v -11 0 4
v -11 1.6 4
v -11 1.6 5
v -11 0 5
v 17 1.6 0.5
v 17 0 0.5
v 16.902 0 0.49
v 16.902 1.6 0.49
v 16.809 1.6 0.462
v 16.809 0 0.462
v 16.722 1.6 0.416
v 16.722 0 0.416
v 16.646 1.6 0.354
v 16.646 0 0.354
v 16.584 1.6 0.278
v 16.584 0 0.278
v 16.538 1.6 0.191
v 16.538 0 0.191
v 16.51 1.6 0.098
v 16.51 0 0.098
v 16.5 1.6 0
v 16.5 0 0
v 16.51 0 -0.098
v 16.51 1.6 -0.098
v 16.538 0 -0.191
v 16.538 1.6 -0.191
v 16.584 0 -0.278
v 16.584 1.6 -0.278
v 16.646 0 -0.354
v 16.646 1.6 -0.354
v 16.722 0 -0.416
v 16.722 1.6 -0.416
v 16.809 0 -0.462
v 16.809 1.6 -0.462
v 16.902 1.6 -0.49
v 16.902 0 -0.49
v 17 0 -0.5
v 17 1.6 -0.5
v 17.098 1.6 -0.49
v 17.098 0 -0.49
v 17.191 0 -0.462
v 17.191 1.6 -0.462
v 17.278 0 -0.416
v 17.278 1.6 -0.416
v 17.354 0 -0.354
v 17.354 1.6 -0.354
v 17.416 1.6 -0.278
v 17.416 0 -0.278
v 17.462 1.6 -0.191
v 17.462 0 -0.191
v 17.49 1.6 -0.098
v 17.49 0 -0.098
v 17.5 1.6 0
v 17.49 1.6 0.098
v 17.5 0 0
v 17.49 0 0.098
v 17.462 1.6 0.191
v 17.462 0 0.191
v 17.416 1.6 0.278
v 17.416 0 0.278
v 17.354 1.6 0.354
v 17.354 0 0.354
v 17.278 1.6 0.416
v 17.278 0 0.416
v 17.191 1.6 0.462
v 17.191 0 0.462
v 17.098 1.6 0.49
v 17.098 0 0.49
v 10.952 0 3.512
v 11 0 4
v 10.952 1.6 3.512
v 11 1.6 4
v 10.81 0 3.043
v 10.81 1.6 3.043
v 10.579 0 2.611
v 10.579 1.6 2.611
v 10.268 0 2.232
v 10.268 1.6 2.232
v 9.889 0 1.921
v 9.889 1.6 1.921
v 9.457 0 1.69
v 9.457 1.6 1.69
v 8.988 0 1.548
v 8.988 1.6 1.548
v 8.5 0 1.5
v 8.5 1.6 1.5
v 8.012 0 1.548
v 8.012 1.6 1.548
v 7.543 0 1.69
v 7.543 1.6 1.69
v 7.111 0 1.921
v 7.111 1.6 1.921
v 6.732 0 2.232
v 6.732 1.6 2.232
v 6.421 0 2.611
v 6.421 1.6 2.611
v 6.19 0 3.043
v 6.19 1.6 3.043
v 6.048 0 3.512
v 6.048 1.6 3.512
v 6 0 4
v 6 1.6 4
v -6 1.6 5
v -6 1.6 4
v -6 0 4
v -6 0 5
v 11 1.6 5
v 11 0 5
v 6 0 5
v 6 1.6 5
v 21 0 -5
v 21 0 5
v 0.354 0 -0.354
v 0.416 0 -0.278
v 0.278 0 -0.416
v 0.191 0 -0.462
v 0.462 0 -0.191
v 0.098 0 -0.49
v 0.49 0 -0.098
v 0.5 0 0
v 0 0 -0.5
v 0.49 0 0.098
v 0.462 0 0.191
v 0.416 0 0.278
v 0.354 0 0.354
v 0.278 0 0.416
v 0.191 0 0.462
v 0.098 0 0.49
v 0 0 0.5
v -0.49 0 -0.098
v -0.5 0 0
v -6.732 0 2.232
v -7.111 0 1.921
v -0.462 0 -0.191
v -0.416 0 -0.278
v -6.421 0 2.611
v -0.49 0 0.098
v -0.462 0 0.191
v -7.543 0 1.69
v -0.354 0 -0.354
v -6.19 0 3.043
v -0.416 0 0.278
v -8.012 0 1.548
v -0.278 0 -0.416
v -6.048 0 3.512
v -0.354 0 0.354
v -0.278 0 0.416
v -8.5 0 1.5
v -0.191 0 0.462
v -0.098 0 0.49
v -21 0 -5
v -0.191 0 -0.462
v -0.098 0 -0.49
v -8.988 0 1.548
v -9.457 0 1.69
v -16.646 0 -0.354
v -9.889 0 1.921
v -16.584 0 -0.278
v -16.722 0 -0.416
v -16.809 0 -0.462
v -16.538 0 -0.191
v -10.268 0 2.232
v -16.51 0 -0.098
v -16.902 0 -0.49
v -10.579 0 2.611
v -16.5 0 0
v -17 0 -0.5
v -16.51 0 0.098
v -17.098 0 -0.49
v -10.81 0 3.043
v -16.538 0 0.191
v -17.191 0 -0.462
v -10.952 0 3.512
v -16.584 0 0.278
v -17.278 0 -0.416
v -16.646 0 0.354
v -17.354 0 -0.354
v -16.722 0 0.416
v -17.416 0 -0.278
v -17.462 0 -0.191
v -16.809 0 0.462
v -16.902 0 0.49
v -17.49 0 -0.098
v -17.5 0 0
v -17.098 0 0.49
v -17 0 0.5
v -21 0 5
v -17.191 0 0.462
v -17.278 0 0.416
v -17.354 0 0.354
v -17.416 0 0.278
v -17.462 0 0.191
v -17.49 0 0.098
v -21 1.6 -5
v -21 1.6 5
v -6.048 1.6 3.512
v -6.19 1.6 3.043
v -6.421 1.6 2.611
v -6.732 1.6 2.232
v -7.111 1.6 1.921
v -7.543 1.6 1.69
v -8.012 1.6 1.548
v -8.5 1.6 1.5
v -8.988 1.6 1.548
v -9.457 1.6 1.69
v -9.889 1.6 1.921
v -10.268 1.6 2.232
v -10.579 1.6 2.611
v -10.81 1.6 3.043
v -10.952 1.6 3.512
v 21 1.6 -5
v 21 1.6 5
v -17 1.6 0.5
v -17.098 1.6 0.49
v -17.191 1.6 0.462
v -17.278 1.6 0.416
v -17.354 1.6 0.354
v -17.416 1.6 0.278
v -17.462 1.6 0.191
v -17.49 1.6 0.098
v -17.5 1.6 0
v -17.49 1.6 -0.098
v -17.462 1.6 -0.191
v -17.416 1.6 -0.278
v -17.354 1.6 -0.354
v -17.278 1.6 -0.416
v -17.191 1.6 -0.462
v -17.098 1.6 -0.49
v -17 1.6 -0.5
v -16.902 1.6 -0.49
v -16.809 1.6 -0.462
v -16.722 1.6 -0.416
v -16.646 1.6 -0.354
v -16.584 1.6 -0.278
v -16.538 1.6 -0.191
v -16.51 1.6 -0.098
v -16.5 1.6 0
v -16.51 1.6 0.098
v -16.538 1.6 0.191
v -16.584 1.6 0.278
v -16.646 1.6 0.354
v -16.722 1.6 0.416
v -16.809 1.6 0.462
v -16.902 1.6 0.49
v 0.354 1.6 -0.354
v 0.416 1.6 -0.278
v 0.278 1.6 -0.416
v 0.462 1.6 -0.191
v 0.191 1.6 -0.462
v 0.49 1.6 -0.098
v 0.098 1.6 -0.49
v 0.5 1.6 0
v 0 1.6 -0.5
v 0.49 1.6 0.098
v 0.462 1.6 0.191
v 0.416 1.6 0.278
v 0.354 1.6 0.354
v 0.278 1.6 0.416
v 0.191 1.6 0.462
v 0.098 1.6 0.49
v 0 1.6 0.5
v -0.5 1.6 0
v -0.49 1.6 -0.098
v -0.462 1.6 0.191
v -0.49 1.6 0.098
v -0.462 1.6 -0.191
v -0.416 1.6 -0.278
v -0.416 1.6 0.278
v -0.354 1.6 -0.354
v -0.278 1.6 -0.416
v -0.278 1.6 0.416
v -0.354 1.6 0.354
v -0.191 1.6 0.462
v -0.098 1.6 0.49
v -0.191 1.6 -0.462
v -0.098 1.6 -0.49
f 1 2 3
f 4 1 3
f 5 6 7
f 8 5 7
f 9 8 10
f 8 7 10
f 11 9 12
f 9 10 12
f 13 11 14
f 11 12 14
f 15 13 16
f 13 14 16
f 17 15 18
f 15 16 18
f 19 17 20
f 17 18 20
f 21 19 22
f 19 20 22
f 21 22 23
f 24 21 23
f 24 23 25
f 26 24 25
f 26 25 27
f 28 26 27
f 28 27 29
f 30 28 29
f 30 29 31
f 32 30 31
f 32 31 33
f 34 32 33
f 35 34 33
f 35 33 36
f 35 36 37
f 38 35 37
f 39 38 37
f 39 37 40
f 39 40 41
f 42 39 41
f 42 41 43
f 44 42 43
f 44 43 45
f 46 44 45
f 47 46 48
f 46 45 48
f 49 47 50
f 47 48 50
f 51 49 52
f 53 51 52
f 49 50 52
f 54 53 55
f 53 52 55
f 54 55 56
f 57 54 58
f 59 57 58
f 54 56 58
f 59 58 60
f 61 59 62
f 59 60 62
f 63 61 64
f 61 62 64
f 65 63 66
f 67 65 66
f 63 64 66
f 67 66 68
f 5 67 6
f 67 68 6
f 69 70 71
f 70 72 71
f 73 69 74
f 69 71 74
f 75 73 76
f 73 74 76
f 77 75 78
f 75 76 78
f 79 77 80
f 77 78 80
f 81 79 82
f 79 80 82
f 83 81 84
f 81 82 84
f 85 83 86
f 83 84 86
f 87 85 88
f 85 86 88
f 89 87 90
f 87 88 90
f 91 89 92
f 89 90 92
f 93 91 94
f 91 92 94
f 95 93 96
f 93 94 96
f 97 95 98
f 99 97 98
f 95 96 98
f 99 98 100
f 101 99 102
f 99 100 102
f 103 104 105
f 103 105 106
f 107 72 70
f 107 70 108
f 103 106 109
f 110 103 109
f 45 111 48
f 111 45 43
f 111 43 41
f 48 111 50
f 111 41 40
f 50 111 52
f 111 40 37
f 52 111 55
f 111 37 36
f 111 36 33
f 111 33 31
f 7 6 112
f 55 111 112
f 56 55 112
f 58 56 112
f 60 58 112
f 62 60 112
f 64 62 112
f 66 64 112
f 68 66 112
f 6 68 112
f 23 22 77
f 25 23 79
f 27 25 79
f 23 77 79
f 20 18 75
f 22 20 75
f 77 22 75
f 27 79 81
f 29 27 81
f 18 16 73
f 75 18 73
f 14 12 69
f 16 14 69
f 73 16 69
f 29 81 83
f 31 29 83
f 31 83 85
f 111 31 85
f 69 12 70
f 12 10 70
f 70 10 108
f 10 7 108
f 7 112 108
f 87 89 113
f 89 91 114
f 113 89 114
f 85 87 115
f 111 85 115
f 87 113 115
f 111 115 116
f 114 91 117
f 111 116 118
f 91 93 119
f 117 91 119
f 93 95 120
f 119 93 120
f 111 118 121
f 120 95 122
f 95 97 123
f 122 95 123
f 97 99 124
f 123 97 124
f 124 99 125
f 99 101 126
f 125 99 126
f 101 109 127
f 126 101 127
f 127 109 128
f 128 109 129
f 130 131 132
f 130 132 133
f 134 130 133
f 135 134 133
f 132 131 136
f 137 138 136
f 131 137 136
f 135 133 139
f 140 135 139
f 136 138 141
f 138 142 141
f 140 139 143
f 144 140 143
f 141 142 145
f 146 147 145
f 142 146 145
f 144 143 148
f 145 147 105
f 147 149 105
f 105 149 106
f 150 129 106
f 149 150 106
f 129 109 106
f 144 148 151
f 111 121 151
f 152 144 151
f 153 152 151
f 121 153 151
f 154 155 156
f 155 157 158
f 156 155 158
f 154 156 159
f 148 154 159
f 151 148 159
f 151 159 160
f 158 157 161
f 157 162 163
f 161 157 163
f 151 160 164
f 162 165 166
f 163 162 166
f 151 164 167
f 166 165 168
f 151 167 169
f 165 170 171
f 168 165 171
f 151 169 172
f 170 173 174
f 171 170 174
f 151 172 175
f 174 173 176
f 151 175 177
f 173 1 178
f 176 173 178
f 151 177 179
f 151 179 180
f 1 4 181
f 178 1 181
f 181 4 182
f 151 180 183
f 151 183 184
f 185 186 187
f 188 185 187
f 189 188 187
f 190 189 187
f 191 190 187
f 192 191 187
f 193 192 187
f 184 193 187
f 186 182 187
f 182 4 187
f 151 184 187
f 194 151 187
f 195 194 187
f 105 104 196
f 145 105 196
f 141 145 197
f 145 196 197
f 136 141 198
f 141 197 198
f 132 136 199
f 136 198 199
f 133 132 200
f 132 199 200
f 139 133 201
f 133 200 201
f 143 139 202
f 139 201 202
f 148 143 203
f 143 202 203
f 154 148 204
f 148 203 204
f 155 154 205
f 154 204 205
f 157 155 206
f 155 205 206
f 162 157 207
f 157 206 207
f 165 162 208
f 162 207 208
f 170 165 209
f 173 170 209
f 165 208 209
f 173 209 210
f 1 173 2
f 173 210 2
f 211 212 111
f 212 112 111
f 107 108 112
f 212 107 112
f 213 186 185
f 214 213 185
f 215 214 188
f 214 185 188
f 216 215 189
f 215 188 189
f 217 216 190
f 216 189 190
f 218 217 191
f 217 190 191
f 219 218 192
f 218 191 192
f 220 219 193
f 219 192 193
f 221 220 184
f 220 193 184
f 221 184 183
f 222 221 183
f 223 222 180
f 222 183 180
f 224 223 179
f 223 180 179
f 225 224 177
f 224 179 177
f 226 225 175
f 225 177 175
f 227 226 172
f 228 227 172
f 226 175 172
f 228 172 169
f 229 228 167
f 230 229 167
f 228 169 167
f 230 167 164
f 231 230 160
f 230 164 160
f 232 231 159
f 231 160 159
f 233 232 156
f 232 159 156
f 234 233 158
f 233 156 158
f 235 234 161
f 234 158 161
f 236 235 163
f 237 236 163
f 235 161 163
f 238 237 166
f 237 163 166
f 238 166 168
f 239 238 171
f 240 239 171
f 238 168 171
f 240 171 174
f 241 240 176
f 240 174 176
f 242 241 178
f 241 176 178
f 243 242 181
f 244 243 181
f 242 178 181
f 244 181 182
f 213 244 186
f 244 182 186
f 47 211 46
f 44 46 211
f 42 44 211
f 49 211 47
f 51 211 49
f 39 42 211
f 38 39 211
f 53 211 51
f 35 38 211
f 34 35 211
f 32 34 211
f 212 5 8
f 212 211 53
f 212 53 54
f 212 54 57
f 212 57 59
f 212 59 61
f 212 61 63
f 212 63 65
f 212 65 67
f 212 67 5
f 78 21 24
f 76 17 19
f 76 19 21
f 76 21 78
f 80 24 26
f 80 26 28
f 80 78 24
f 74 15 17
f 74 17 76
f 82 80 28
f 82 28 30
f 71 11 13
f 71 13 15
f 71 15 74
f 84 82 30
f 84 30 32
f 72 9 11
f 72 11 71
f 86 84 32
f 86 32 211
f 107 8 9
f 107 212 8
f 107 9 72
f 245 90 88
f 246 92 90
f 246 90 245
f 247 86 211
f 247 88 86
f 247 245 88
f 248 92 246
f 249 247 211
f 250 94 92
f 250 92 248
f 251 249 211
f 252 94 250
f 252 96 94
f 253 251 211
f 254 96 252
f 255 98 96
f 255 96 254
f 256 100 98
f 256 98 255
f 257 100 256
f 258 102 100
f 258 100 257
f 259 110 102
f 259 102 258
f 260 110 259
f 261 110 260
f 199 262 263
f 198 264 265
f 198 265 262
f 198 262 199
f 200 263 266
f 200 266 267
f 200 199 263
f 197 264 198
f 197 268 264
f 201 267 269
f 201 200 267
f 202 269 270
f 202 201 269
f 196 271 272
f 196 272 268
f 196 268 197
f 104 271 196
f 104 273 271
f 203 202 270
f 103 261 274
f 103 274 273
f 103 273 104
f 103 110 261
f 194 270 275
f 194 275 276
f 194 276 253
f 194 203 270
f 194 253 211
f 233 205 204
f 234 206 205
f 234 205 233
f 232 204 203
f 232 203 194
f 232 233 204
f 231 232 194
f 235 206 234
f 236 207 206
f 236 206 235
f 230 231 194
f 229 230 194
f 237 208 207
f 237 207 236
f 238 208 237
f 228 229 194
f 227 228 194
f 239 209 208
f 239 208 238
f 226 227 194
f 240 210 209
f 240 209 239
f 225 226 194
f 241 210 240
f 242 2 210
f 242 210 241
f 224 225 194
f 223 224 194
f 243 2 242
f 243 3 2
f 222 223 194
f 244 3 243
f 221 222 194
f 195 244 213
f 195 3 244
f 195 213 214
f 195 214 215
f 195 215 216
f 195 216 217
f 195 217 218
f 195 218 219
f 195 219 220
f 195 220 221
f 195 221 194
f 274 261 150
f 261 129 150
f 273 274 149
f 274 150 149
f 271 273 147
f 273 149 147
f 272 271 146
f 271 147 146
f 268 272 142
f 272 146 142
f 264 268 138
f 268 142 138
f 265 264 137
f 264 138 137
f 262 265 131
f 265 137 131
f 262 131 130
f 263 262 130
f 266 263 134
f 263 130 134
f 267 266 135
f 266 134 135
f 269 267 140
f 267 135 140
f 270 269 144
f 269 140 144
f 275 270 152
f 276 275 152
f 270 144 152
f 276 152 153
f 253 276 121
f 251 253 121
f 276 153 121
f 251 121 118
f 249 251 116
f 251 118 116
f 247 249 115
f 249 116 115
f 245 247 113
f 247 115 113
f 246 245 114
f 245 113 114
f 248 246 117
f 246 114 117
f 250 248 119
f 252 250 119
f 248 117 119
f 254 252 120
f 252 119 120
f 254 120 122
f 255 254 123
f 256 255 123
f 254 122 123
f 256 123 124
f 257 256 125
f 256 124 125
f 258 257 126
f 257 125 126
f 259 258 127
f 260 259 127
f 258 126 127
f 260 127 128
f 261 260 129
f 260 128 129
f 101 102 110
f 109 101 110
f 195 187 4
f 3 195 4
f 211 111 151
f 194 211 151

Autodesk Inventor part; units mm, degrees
ref_plane "YZ Plane" through (0, 0, 0) normal (1, 0, 0) x (0, 1, 0)
ref_plane "XZ Plane" through (0, 0, 0) normal (0, 1, 0) x (-1, 0, 0)
ref_plane "XY Plane" through (0, 0, 0) normal (0, 0, 1) x (1, 0, 0)
sketch "Sketch1" plane through (0, 0, 0) normal (0, 1, 0) x (-1, 0, 0)
  line L0 (21, 5) -> (-21, 5)
  line L1 (-21, 5) -> (-21, -5)
  line L2 (-21, -5) -> (21, -5)
  line L3 (21, -5) -> (21, 5)
  point P0 (0, 0)
  point P1 (21, 0)
  point P2 (0, -5)
  point P3 (17, 0)
  point P4 (0, 0)
  point P5 (-17, 0)
  dimension "d0" = 42
  dimension "d1" = 10
  dimension "d2" = 17
  dimension "d3" = 17
extrude "Extrusion1" add sketch "Sketch1" along normal blind 1.6
sketch "Sketch2" plane through (0, 1.6, 0) normal (0, 1, 0) x (1, 0, 0)
  point P0 (0, 0)
  point P1 (-17, 0)
  point P2 (0, 0)
  point P3 (17, 0)
hole "Hole1" at (-17, 1.6, 0) at (0, 1.6, 0) at (17, 1.6, 0) direction (0, -1, 0) diameter 1 end through all
sketch "Sketch3" plane through (0, 1.6, 0) normal (0, 1, 0) x (1, 0, 0)
  line L0 (-21, -5) -> (21, -5) projected
  line L1 (-21, -5) -> (21, -5) projected
  line L2 (-8.5, 0.5052) -> (-8.5, -1.9497) construction
  line L3 (8.5, -1.3927) -> (8.5, 1.0622) construction
  arc A0 (-6, -4) -> (-11, -4) centre (-8.5, -4) ccw
  arc A1 (11, -4) -> (6, -4) centre (8.5, -4) ccw
  line L4 (-11, -4) -> (-11, -5)
  line L5 (-6, -4) -> (-6, -5)
  line L6 (6, -4) -> (6, -5)
  line L7 (11, -4) -> (11, -5)
  point P0 (0, 0)
  dimension "d15" = 17
  dimension "d16" = 8.5
  dimension "d21" = 5
  dimension "d22" = 1
extrude "Extrusion2" cut sketch "Sketch3" against normal blind 1.6
equation "\"d3\" = d2"
properties part number "Pinhole_insert_1mm_3x"
